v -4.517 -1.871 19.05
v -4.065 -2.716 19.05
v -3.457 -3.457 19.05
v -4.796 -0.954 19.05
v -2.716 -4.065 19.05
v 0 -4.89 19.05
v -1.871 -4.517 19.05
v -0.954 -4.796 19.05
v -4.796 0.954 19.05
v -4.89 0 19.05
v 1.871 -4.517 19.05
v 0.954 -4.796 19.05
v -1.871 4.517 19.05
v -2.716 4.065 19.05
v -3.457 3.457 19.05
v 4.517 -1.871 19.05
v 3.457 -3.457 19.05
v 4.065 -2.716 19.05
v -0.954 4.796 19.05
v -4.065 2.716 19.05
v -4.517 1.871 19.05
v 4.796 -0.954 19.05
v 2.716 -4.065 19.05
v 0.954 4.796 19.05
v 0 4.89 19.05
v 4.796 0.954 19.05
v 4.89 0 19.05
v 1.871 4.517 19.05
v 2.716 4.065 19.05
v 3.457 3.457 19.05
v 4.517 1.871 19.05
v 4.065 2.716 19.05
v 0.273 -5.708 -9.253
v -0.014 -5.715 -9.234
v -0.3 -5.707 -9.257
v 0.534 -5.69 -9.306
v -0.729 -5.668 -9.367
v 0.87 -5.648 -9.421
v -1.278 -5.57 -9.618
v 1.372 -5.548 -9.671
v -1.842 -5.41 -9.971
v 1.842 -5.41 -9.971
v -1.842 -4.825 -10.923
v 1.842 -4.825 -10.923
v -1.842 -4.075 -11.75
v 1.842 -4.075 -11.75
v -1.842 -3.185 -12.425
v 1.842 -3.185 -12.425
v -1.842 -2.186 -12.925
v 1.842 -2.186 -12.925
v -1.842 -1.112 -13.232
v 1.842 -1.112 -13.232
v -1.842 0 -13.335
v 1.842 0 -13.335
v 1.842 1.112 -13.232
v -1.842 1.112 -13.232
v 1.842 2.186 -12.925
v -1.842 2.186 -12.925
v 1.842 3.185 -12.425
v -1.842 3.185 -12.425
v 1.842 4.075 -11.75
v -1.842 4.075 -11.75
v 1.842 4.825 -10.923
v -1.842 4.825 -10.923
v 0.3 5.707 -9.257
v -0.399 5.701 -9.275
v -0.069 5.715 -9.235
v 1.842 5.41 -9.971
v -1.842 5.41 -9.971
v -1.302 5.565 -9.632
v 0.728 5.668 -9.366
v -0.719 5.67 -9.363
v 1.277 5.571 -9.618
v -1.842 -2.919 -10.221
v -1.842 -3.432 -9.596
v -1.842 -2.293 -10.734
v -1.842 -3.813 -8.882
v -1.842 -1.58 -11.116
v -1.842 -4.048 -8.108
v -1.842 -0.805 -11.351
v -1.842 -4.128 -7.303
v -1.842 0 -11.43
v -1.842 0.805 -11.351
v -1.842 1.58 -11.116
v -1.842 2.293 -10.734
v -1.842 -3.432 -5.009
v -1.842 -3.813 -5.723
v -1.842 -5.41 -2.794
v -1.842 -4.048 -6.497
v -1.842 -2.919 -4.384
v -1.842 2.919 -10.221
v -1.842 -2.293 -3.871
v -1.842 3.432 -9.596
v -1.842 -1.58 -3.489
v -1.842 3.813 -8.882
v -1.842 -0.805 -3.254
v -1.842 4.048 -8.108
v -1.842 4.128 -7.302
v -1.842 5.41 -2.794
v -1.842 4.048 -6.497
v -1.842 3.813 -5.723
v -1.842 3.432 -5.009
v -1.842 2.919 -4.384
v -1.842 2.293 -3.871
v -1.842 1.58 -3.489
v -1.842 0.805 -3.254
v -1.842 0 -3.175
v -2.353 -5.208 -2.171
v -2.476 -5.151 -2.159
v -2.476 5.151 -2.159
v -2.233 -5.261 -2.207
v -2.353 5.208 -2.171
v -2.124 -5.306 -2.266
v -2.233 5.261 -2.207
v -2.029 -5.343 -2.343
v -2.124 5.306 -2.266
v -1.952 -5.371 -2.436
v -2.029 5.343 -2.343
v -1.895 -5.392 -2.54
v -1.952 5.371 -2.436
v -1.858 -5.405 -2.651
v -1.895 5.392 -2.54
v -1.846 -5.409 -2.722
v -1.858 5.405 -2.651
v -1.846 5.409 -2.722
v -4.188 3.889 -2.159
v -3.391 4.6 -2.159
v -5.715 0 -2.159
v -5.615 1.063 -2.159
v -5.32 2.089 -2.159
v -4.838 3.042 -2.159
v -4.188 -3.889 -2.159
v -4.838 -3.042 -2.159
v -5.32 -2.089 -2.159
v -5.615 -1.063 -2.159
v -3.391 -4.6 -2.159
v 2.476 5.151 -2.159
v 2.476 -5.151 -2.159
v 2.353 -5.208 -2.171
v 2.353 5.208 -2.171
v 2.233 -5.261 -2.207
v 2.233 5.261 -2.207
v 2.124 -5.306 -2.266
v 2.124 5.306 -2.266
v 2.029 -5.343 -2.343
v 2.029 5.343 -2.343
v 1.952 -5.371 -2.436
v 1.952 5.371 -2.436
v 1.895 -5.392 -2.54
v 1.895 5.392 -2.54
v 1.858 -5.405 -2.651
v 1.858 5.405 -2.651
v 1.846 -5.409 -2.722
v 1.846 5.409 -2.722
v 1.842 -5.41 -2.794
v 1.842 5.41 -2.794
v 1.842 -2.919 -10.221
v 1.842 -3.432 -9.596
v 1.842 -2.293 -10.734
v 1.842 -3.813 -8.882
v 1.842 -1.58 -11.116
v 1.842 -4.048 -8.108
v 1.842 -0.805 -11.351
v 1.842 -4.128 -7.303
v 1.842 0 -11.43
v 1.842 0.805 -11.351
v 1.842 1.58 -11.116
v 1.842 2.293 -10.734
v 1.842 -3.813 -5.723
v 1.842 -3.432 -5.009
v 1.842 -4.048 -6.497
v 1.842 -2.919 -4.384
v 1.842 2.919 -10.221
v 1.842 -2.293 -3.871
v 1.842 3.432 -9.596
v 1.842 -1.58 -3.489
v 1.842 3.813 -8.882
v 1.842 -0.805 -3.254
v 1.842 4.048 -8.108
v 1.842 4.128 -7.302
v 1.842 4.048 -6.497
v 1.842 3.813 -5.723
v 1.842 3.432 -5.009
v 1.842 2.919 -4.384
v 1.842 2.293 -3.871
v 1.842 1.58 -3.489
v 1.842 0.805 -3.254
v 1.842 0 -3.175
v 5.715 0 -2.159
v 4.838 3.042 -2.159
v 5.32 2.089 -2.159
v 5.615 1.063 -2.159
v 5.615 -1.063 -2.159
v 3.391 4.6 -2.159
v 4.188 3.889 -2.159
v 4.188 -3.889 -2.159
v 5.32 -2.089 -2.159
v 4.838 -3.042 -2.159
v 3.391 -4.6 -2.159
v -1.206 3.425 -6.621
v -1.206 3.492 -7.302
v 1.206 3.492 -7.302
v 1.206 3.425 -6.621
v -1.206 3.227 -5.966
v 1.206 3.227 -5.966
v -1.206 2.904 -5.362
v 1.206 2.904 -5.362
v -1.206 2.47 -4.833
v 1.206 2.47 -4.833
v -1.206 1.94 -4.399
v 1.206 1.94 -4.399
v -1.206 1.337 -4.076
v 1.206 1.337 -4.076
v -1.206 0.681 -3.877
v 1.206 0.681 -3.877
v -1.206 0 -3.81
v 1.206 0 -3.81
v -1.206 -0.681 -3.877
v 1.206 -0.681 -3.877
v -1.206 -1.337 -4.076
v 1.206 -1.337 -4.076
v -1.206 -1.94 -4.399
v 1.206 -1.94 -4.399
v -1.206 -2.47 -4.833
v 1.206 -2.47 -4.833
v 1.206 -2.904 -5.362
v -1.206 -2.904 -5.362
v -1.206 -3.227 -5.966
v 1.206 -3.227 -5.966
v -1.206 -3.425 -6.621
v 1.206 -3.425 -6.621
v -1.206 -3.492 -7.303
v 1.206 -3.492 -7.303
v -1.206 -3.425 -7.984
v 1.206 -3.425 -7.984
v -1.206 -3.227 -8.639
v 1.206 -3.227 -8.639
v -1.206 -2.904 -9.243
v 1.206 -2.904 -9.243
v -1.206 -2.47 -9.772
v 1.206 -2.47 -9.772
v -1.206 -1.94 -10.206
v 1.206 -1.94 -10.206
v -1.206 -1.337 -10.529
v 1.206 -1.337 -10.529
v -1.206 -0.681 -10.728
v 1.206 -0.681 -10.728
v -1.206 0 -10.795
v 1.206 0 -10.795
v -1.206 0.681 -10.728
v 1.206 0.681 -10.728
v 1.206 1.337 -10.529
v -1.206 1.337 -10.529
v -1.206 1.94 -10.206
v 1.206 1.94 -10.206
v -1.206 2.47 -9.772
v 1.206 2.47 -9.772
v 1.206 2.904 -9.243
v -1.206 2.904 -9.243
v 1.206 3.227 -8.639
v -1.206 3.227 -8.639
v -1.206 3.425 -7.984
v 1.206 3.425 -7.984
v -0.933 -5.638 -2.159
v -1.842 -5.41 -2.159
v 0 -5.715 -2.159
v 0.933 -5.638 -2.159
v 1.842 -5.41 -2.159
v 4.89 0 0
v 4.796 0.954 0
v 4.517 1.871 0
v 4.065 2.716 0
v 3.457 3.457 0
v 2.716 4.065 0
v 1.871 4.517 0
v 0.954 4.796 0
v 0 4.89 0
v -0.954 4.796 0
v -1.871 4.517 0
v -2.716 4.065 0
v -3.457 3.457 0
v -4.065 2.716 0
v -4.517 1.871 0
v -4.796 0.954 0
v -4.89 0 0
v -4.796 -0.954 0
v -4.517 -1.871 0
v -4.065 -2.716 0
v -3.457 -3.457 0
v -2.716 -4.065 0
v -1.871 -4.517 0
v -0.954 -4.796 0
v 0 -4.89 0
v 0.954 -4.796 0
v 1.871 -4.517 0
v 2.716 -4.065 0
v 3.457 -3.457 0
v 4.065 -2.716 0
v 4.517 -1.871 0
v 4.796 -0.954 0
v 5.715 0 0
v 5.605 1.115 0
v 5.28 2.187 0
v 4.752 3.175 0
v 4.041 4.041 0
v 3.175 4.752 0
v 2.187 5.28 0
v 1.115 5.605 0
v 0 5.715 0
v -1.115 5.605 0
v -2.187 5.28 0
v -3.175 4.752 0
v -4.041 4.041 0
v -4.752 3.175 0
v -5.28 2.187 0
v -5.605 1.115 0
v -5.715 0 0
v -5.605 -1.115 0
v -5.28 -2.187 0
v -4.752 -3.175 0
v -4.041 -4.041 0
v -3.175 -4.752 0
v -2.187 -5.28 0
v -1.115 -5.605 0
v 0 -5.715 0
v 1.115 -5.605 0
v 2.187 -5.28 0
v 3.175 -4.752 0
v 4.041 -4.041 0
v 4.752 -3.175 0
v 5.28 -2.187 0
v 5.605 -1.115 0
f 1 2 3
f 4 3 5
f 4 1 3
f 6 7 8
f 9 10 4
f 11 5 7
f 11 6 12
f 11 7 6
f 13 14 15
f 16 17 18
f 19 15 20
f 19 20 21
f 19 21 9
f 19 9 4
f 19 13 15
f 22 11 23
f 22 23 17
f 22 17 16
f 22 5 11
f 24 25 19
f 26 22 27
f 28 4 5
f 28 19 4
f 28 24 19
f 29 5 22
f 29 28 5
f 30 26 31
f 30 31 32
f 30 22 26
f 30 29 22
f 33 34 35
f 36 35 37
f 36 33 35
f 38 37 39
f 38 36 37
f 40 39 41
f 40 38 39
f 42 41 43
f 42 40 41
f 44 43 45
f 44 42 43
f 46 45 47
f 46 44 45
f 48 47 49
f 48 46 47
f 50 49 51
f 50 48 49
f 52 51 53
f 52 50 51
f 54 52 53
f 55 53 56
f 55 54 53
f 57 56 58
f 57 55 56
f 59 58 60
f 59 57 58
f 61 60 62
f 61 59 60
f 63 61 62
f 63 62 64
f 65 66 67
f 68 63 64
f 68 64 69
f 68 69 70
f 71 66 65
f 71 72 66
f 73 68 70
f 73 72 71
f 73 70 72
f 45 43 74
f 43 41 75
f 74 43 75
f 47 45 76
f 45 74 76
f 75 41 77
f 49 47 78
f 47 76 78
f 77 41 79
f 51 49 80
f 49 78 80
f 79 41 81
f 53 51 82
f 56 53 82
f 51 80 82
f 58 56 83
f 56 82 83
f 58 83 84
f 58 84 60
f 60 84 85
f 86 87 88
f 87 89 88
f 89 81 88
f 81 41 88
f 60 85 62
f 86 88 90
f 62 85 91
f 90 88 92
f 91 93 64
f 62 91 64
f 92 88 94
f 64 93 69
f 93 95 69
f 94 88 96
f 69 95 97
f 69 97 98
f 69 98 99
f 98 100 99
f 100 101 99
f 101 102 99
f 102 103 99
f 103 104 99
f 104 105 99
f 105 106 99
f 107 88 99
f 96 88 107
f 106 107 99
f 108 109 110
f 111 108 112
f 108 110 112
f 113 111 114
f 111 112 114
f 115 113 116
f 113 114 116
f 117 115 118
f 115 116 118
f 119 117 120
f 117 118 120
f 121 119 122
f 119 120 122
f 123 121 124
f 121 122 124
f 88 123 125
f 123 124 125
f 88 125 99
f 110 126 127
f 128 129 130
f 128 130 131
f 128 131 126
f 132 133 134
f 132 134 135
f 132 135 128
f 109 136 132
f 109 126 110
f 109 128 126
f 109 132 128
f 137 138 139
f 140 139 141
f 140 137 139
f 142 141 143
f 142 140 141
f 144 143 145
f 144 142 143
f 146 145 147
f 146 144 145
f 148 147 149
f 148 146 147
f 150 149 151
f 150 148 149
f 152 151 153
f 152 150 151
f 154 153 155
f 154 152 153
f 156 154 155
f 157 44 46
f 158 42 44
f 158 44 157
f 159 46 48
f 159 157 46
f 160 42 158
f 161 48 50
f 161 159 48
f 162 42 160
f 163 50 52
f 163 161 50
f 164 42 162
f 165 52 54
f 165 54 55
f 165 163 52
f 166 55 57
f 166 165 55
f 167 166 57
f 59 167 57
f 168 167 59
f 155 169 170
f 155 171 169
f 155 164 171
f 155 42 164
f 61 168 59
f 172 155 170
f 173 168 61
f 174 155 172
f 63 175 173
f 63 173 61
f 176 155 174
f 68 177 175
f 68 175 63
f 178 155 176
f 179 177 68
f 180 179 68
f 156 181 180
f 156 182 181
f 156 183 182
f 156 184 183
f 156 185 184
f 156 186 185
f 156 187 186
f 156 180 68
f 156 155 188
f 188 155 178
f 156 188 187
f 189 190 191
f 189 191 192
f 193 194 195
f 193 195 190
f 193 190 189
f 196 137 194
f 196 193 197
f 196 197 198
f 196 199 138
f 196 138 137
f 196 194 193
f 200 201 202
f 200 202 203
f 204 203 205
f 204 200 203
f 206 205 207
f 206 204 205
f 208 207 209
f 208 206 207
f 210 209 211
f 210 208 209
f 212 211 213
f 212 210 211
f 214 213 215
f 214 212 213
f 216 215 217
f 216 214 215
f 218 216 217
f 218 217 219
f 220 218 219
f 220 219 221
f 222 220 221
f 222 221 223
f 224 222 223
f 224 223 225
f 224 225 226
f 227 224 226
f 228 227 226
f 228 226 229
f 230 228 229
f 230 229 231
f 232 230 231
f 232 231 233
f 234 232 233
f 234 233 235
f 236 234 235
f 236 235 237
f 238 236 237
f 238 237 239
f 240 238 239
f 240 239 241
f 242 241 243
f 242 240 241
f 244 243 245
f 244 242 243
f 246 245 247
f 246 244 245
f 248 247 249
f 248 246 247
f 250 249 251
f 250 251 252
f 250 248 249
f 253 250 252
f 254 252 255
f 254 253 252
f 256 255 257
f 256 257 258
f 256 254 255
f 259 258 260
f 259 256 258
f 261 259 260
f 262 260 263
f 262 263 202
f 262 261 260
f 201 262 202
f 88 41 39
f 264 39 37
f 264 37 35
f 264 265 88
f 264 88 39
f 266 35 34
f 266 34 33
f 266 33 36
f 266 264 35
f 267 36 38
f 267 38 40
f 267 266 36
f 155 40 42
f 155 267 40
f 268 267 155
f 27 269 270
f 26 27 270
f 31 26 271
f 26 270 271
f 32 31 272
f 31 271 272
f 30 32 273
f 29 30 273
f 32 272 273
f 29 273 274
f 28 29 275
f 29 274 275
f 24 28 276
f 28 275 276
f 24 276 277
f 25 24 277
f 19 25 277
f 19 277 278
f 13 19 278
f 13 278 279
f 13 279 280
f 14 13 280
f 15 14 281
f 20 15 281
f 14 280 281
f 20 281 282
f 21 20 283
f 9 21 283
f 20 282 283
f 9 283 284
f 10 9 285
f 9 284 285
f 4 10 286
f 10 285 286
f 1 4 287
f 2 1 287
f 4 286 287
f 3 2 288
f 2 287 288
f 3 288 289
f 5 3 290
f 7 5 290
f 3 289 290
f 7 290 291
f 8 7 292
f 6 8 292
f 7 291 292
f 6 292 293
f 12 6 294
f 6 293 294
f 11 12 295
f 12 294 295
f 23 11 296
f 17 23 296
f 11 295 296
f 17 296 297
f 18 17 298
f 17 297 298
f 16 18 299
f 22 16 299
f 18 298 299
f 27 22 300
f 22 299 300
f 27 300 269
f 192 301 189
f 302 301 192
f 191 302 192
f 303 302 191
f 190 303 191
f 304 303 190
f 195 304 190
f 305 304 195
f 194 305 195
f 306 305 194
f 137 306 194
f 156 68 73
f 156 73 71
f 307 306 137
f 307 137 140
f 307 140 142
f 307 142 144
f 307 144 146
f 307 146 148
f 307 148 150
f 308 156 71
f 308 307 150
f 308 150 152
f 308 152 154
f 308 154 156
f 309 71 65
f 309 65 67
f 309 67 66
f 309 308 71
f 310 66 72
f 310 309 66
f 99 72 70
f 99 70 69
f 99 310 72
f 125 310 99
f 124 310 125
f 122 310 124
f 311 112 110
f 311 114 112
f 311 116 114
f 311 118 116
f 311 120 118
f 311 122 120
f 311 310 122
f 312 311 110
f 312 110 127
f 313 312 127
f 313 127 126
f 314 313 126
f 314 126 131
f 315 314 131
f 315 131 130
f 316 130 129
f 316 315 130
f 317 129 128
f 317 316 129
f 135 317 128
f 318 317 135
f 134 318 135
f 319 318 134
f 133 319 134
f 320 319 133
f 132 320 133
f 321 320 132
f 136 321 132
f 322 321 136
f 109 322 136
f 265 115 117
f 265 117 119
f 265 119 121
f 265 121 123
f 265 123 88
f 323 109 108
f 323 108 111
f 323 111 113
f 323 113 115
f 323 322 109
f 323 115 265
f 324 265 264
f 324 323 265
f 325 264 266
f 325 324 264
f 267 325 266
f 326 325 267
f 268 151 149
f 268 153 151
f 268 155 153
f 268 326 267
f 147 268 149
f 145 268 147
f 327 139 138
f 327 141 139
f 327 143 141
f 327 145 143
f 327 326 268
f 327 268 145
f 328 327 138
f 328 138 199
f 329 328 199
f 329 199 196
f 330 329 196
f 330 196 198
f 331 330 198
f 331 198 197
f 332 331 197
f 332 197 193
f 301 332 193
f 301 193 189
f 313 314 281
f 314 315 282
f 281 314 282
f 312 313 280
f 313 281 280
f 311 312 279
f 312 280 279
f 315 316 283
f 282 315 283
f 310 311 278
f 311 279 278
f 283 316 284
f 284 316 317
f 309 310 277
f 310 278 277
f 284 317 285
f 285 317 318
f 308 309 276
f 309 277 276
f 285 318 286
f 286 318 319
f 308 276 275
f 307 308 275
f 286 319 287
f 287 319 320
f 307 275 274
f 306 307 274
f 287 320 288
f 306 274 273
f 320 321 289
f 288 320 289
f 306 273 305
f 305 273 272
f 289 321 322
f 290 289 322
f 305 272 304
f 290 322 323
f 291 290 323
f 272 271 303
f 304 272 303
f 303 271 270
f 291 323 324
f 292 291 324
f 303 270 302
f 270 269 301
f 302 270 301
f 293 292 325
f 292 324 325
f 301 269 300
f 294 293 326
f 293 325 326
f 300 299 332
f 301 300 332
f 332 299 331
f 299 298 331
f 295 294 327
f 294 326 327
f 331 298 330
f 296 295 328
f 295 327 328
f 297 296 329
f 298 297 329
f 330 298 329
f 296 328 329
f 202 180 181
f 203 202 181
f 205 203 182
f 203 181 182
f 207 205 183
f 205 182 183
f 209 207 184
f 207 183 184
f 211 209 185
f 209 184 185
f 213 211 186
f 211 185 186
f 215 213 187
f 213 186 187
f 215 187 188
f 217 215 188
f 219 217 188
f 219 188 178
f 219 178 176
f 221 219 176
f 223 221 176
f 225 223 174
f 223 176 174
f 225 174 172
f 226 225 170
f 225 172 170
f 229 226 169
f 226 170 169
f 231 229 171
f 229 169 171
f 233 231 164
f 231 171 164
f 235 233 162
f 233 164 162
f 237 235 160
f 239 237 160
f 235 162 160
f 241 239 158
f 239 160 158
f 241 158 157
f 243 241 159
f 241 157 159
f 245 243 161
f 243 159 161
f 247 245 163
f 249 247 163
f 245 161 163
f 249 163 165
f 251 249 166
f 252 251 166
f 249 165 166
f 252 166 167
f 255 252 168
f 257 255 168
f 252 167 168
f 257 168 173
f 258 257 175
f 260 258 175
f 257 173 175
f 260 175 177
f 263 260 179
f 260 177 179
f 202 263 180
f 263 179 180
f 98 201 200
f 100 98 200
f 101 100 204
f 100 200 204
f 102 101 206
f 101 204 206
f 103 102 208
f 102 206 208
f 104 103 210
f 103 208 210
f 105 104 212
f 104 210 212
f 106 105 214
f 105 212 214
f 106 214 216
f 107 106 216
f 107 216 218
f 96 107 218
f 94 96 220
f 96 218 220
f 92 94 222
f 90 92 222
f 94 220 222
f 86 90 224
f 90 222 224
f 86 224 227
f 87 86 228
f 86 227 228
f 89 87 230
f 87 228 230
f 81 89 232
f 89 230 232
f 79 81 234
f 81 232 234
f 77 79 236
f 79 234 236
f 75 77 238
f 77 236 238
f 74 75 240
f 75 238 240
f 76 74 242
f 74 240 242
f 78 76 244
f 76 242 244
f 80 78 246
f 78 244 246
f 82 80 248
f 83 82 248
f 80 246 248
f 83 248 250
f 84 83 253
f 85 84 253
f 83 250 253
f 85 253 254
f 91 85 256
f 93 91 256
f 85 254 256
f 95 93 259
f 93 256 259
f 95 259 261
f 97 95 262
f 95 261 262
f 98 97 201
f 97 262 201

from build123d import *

# Parameters (mm, degrees)
F0_R          = 4.8895
F1_DEPTH      = 19.05
F2_R          = 5.715
F3_DEPTH      = 2.159
F4_R          = 3.4925
F5_DEPTH      = 1.8415
F5_DEPTH_BACK = 1.8415
F6_R          = 8.89
F7_DEPTH      = 25.4
F8_T4_DEPTH   = 13.9953701878
F8_S5_R       = 5.715
F8_T6_DEPTH   = 9
F8_T10_DEPTH  = 13.9953701878
F8_S11_R      = 5.715
F8_T12_DEPTH  = 9
F9_SIZE       = 0.635


# Not quite as in the source:
# - a fillet or chamfer that OpenCascade refuses, or shapes differently, is made with other operations: its cross-section is extruded or revolved along the edge and cut away or added
# - after a boolean that leaves OpenCascade's solid faulty, fix() repairs it


with BuildPart() as f1:
    # F0 (on Top) → F1 (new body)
    with BuildSketch(Plane.XY):
        Circle(F0_R)
    extrude(amount=F1_DEPTH)

    # F2 (on face) → F3 (join)
    with BuildSketch(Plane(origin=(0, 0, 0), x_dir=(1, 0, 0), z_dir=(0, 0, -1))):
        Circle(F2_R)
    extrude(amount=F3_DEPTH)

    # F4 (on Right) → F5 (join, two sides)
    with BuildSketch(Plane.YZ) as f5_sk:
        with BuildLine():
            Line((5.715, -2.159), (-5.715, -2.159))
            Line((-5.715, -2.159), (-5.715, -9.2337771034))
            ThreePointArc((-5.715, -9.2337771034), (0, -13.335), (5.715, -9.2337771034))
            Line((5.715, -9.2337771034), (5.715, -2.159))
        make_face()
        with Locations((0, -7.3025)):
            Circle(F4_R, mode=Mode.SUBTRACT)
    extrude(amount=F5_DEPTH)
    extrude(f5_sk.sketch, amount=-F5_DEPTH_BACK)

    # F6 (on face) → F7 (cut)
    with BuildSketch(Plane(origin=(0, 0, -2.159), x_dir=(1, 0, 0), z_dir=(0, 0, -1))):
        Circle(F6_R)
        with BuildLine():
            ThreePointArc((-1.8415, 5.4101850939), (3.3269394719, 4.6467944596), (5.715, 0))
            ThreePointArc((5.715, 0), (3.3269394719, -4.6467944596), (-1.8415, -5.4101850939))
            ThreePointArc((-1.8415, -5.4101850939), (-5.715, 0), (-1.8415, 5.4101850939))
        make_face(mode=Mode.SUBTRACT)
    extrude(amount=F7_DEPTH, mode=Mode.SUBTRACT)

    add(f1.part.fix(), mode=Mode.REPLACE)

    # F8: fillet of radius 0.635 on 2 edges, made by hand


with BuildPart() as f8_tool2:
    # F8_s3 → F8_t4 (new body)
    with BuildSketch(Plane.XZ.offset(-6.9976850939)):
        with BuildLine():
            ThreePointArc((2.4765, -2.159), (2.0274871939, -2.3449871939), (1.8415, -2.794))
            Line((1.8415, -2.794), (1.8415, -2.159))
            Line((1.8415, -2.159), (2.4765, -2.159))
        make_face()
    extrude(amount=F8_T4_DEPTH)

    # F8_s5 → F8_t6 (intersect, symmetric)
    with BuildSketch(Plane.XY.offset(-2.5)):
        Circle(F8_S5_R)
    extrude(amount=F8_T6_DEPTH, both=True, mode=Mode.INTERSECT)


with BuildPart() as f1_1:
    add(f1.part)

    # F8_t1: union F8_tool2
    add(f8_tool2.part)


with BuildPart() as f8_tool8:
    # F8_s9 → F8_t10 (new body)
    with BuildSketch(Plane.XZ.offset(-6.9976850939)):
        with BuildLine():
            ThreePointArc((-2.4765, -2.159), (-2.0274871939, -2.3449871939), (-1.8415, -2.794))
            Line((-1.8415, -2.794), (-1.8415, -2.159))
            Line((-1.8415, -2.159), (-2.4765, -2.159))
        make_face()
    extrude(amount=F8_T10_DEPTH)

    # F8_s11 → F8_t12 (intersect, symmetric)
    with BuildSketch(Plane.XY.offset(-2.5)):
        Circle(F8_S11_R)
    extrude(amount=F8_T12_DEPTH, both=True, mode=Mode.INTERSECT)


with BuildPart() as f1_2:
    add(f1_1.part)

    # F8_t7: union F8_tool8
    add(f8_tool8.part)

    # F9
    f9_edges = [f1_2.edges().sort_by_distance(p)[0] for p in [
        (-1.8415, -3.4925, -7.3025),
        (1.8415, -3.4925, -7.3025),
    ]]
    chamfer(f9_edges, length=F9_SIZE)


solid = f1_2.part
